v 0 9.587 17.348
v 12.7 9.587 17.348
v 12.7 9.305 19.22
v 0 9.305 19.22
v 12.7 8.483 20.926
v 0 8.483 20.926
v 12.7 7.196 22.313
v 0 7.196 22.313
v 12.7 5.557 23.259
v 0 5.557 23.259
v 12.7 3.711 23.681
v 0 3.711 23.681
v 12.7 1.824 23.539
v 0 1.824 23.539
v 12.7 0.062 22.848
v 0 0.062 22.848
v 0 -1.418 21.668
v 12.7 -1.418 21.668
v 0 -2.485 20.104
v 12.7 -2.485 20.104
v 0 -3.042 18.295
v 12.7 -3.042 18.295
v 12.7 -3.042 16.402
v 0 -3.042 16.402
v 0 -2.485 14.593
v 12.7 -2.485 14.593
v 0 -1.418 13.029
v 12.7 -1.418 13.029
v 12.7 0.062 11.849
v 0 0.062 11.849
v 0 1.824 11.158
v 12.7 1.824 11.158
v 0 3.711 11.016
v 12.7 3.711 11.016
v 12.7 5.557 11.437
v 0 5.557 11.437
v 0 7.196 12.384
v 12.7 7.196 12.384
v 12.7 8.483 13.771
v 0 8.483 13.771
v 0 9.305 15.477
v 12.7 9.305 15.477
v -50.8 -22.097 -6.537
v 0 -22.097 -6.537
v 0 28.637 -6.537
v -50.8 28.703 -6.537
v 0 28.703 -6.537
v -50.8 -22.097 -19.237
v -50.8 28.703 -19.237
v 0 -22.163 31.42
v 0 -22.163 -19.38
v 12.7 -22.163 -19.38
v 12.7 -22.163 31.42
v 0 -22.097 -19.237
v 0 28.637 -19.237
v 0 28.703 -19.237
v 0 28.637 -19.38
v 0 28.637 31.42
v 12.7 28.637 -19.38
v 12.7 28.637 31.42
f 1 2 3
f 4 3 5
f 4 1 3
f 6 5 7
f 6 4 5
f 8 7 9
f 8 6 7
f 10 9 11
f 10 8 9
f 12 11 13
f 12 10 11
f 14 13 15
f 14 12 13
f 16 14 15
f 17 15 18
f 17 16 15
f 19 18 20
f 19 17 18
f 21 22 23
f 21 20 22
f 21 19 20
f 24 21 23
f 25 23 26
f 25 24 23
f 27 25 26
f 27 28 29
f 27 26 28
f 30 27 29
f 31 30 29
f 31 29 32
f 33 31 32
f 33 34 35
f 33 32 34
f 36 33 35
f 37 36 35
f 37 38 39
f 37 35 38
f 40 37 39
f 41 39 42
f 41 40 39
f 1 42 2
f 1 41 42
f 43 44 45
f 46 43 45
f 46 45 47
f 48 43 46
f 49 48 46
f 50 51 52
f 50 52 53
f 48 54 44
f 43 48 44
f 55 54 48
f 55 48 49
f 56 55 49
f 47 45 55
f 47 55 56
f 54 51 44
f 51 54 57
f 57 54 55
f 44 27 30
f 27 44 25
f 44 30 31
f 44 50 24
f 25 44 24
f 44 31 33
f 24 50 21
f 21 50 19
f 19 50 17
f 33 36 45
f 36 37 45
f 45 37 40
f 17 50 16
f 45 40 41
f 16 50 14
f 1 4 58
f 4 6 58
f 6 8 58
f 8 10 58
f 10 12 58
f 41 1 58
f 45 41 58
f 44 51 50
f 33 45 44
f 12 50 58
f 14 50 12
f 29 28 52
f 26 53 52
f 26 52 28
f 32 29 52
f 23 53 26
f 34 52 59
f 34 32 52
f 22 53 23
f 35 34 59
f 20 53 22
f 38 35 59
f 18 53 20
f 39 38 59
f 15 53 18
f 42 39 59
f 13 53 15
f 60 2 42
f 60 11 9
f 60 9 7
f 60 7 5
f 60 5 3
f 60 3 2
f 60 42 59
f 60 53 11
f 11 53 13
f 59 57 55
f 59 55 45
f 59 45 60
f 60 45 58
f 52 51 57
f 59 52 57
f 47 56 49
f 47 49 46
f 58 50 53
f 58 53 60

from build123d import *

# Parameters (mm, degrees)
F0_W     = 50.8
F0_H     = 50.8
F2_DEPTH = 12.7
F1_W     = 50.8
F1_H     = 12.7
F3_DEPTH = 50.8
F4_R     = 6.35
F5_DEPTH = 12.701


with BuildPart() as f2:
    # F0 (on Right) → F2 (new body)
    with BuildSketch(Plane.YZ):
        with Locations((3.236649, 6.020112)):
            Rectangle(F0_W, F0_H)
    extrude(amount=F2_DEPTH)

    # F1 (on Right) → F3 (join)
    with BuildSketch(Plane.YZ):
        with Locations((3.302505, -12.88737)):
            Rectangle(F1_W, F1_H)
    extrude(amount=-F3_DEPTH)

    # F4 (on Right) → F5 (cut, through all)
    with BuildSketch(Plane.YZ):
        with Locations((3.236649, 17.348448)):
            Circle(F4_R)
    extrude(amount=F5_DEPTH, mode=Mode.SUBTRACT)


solid = f2.part
